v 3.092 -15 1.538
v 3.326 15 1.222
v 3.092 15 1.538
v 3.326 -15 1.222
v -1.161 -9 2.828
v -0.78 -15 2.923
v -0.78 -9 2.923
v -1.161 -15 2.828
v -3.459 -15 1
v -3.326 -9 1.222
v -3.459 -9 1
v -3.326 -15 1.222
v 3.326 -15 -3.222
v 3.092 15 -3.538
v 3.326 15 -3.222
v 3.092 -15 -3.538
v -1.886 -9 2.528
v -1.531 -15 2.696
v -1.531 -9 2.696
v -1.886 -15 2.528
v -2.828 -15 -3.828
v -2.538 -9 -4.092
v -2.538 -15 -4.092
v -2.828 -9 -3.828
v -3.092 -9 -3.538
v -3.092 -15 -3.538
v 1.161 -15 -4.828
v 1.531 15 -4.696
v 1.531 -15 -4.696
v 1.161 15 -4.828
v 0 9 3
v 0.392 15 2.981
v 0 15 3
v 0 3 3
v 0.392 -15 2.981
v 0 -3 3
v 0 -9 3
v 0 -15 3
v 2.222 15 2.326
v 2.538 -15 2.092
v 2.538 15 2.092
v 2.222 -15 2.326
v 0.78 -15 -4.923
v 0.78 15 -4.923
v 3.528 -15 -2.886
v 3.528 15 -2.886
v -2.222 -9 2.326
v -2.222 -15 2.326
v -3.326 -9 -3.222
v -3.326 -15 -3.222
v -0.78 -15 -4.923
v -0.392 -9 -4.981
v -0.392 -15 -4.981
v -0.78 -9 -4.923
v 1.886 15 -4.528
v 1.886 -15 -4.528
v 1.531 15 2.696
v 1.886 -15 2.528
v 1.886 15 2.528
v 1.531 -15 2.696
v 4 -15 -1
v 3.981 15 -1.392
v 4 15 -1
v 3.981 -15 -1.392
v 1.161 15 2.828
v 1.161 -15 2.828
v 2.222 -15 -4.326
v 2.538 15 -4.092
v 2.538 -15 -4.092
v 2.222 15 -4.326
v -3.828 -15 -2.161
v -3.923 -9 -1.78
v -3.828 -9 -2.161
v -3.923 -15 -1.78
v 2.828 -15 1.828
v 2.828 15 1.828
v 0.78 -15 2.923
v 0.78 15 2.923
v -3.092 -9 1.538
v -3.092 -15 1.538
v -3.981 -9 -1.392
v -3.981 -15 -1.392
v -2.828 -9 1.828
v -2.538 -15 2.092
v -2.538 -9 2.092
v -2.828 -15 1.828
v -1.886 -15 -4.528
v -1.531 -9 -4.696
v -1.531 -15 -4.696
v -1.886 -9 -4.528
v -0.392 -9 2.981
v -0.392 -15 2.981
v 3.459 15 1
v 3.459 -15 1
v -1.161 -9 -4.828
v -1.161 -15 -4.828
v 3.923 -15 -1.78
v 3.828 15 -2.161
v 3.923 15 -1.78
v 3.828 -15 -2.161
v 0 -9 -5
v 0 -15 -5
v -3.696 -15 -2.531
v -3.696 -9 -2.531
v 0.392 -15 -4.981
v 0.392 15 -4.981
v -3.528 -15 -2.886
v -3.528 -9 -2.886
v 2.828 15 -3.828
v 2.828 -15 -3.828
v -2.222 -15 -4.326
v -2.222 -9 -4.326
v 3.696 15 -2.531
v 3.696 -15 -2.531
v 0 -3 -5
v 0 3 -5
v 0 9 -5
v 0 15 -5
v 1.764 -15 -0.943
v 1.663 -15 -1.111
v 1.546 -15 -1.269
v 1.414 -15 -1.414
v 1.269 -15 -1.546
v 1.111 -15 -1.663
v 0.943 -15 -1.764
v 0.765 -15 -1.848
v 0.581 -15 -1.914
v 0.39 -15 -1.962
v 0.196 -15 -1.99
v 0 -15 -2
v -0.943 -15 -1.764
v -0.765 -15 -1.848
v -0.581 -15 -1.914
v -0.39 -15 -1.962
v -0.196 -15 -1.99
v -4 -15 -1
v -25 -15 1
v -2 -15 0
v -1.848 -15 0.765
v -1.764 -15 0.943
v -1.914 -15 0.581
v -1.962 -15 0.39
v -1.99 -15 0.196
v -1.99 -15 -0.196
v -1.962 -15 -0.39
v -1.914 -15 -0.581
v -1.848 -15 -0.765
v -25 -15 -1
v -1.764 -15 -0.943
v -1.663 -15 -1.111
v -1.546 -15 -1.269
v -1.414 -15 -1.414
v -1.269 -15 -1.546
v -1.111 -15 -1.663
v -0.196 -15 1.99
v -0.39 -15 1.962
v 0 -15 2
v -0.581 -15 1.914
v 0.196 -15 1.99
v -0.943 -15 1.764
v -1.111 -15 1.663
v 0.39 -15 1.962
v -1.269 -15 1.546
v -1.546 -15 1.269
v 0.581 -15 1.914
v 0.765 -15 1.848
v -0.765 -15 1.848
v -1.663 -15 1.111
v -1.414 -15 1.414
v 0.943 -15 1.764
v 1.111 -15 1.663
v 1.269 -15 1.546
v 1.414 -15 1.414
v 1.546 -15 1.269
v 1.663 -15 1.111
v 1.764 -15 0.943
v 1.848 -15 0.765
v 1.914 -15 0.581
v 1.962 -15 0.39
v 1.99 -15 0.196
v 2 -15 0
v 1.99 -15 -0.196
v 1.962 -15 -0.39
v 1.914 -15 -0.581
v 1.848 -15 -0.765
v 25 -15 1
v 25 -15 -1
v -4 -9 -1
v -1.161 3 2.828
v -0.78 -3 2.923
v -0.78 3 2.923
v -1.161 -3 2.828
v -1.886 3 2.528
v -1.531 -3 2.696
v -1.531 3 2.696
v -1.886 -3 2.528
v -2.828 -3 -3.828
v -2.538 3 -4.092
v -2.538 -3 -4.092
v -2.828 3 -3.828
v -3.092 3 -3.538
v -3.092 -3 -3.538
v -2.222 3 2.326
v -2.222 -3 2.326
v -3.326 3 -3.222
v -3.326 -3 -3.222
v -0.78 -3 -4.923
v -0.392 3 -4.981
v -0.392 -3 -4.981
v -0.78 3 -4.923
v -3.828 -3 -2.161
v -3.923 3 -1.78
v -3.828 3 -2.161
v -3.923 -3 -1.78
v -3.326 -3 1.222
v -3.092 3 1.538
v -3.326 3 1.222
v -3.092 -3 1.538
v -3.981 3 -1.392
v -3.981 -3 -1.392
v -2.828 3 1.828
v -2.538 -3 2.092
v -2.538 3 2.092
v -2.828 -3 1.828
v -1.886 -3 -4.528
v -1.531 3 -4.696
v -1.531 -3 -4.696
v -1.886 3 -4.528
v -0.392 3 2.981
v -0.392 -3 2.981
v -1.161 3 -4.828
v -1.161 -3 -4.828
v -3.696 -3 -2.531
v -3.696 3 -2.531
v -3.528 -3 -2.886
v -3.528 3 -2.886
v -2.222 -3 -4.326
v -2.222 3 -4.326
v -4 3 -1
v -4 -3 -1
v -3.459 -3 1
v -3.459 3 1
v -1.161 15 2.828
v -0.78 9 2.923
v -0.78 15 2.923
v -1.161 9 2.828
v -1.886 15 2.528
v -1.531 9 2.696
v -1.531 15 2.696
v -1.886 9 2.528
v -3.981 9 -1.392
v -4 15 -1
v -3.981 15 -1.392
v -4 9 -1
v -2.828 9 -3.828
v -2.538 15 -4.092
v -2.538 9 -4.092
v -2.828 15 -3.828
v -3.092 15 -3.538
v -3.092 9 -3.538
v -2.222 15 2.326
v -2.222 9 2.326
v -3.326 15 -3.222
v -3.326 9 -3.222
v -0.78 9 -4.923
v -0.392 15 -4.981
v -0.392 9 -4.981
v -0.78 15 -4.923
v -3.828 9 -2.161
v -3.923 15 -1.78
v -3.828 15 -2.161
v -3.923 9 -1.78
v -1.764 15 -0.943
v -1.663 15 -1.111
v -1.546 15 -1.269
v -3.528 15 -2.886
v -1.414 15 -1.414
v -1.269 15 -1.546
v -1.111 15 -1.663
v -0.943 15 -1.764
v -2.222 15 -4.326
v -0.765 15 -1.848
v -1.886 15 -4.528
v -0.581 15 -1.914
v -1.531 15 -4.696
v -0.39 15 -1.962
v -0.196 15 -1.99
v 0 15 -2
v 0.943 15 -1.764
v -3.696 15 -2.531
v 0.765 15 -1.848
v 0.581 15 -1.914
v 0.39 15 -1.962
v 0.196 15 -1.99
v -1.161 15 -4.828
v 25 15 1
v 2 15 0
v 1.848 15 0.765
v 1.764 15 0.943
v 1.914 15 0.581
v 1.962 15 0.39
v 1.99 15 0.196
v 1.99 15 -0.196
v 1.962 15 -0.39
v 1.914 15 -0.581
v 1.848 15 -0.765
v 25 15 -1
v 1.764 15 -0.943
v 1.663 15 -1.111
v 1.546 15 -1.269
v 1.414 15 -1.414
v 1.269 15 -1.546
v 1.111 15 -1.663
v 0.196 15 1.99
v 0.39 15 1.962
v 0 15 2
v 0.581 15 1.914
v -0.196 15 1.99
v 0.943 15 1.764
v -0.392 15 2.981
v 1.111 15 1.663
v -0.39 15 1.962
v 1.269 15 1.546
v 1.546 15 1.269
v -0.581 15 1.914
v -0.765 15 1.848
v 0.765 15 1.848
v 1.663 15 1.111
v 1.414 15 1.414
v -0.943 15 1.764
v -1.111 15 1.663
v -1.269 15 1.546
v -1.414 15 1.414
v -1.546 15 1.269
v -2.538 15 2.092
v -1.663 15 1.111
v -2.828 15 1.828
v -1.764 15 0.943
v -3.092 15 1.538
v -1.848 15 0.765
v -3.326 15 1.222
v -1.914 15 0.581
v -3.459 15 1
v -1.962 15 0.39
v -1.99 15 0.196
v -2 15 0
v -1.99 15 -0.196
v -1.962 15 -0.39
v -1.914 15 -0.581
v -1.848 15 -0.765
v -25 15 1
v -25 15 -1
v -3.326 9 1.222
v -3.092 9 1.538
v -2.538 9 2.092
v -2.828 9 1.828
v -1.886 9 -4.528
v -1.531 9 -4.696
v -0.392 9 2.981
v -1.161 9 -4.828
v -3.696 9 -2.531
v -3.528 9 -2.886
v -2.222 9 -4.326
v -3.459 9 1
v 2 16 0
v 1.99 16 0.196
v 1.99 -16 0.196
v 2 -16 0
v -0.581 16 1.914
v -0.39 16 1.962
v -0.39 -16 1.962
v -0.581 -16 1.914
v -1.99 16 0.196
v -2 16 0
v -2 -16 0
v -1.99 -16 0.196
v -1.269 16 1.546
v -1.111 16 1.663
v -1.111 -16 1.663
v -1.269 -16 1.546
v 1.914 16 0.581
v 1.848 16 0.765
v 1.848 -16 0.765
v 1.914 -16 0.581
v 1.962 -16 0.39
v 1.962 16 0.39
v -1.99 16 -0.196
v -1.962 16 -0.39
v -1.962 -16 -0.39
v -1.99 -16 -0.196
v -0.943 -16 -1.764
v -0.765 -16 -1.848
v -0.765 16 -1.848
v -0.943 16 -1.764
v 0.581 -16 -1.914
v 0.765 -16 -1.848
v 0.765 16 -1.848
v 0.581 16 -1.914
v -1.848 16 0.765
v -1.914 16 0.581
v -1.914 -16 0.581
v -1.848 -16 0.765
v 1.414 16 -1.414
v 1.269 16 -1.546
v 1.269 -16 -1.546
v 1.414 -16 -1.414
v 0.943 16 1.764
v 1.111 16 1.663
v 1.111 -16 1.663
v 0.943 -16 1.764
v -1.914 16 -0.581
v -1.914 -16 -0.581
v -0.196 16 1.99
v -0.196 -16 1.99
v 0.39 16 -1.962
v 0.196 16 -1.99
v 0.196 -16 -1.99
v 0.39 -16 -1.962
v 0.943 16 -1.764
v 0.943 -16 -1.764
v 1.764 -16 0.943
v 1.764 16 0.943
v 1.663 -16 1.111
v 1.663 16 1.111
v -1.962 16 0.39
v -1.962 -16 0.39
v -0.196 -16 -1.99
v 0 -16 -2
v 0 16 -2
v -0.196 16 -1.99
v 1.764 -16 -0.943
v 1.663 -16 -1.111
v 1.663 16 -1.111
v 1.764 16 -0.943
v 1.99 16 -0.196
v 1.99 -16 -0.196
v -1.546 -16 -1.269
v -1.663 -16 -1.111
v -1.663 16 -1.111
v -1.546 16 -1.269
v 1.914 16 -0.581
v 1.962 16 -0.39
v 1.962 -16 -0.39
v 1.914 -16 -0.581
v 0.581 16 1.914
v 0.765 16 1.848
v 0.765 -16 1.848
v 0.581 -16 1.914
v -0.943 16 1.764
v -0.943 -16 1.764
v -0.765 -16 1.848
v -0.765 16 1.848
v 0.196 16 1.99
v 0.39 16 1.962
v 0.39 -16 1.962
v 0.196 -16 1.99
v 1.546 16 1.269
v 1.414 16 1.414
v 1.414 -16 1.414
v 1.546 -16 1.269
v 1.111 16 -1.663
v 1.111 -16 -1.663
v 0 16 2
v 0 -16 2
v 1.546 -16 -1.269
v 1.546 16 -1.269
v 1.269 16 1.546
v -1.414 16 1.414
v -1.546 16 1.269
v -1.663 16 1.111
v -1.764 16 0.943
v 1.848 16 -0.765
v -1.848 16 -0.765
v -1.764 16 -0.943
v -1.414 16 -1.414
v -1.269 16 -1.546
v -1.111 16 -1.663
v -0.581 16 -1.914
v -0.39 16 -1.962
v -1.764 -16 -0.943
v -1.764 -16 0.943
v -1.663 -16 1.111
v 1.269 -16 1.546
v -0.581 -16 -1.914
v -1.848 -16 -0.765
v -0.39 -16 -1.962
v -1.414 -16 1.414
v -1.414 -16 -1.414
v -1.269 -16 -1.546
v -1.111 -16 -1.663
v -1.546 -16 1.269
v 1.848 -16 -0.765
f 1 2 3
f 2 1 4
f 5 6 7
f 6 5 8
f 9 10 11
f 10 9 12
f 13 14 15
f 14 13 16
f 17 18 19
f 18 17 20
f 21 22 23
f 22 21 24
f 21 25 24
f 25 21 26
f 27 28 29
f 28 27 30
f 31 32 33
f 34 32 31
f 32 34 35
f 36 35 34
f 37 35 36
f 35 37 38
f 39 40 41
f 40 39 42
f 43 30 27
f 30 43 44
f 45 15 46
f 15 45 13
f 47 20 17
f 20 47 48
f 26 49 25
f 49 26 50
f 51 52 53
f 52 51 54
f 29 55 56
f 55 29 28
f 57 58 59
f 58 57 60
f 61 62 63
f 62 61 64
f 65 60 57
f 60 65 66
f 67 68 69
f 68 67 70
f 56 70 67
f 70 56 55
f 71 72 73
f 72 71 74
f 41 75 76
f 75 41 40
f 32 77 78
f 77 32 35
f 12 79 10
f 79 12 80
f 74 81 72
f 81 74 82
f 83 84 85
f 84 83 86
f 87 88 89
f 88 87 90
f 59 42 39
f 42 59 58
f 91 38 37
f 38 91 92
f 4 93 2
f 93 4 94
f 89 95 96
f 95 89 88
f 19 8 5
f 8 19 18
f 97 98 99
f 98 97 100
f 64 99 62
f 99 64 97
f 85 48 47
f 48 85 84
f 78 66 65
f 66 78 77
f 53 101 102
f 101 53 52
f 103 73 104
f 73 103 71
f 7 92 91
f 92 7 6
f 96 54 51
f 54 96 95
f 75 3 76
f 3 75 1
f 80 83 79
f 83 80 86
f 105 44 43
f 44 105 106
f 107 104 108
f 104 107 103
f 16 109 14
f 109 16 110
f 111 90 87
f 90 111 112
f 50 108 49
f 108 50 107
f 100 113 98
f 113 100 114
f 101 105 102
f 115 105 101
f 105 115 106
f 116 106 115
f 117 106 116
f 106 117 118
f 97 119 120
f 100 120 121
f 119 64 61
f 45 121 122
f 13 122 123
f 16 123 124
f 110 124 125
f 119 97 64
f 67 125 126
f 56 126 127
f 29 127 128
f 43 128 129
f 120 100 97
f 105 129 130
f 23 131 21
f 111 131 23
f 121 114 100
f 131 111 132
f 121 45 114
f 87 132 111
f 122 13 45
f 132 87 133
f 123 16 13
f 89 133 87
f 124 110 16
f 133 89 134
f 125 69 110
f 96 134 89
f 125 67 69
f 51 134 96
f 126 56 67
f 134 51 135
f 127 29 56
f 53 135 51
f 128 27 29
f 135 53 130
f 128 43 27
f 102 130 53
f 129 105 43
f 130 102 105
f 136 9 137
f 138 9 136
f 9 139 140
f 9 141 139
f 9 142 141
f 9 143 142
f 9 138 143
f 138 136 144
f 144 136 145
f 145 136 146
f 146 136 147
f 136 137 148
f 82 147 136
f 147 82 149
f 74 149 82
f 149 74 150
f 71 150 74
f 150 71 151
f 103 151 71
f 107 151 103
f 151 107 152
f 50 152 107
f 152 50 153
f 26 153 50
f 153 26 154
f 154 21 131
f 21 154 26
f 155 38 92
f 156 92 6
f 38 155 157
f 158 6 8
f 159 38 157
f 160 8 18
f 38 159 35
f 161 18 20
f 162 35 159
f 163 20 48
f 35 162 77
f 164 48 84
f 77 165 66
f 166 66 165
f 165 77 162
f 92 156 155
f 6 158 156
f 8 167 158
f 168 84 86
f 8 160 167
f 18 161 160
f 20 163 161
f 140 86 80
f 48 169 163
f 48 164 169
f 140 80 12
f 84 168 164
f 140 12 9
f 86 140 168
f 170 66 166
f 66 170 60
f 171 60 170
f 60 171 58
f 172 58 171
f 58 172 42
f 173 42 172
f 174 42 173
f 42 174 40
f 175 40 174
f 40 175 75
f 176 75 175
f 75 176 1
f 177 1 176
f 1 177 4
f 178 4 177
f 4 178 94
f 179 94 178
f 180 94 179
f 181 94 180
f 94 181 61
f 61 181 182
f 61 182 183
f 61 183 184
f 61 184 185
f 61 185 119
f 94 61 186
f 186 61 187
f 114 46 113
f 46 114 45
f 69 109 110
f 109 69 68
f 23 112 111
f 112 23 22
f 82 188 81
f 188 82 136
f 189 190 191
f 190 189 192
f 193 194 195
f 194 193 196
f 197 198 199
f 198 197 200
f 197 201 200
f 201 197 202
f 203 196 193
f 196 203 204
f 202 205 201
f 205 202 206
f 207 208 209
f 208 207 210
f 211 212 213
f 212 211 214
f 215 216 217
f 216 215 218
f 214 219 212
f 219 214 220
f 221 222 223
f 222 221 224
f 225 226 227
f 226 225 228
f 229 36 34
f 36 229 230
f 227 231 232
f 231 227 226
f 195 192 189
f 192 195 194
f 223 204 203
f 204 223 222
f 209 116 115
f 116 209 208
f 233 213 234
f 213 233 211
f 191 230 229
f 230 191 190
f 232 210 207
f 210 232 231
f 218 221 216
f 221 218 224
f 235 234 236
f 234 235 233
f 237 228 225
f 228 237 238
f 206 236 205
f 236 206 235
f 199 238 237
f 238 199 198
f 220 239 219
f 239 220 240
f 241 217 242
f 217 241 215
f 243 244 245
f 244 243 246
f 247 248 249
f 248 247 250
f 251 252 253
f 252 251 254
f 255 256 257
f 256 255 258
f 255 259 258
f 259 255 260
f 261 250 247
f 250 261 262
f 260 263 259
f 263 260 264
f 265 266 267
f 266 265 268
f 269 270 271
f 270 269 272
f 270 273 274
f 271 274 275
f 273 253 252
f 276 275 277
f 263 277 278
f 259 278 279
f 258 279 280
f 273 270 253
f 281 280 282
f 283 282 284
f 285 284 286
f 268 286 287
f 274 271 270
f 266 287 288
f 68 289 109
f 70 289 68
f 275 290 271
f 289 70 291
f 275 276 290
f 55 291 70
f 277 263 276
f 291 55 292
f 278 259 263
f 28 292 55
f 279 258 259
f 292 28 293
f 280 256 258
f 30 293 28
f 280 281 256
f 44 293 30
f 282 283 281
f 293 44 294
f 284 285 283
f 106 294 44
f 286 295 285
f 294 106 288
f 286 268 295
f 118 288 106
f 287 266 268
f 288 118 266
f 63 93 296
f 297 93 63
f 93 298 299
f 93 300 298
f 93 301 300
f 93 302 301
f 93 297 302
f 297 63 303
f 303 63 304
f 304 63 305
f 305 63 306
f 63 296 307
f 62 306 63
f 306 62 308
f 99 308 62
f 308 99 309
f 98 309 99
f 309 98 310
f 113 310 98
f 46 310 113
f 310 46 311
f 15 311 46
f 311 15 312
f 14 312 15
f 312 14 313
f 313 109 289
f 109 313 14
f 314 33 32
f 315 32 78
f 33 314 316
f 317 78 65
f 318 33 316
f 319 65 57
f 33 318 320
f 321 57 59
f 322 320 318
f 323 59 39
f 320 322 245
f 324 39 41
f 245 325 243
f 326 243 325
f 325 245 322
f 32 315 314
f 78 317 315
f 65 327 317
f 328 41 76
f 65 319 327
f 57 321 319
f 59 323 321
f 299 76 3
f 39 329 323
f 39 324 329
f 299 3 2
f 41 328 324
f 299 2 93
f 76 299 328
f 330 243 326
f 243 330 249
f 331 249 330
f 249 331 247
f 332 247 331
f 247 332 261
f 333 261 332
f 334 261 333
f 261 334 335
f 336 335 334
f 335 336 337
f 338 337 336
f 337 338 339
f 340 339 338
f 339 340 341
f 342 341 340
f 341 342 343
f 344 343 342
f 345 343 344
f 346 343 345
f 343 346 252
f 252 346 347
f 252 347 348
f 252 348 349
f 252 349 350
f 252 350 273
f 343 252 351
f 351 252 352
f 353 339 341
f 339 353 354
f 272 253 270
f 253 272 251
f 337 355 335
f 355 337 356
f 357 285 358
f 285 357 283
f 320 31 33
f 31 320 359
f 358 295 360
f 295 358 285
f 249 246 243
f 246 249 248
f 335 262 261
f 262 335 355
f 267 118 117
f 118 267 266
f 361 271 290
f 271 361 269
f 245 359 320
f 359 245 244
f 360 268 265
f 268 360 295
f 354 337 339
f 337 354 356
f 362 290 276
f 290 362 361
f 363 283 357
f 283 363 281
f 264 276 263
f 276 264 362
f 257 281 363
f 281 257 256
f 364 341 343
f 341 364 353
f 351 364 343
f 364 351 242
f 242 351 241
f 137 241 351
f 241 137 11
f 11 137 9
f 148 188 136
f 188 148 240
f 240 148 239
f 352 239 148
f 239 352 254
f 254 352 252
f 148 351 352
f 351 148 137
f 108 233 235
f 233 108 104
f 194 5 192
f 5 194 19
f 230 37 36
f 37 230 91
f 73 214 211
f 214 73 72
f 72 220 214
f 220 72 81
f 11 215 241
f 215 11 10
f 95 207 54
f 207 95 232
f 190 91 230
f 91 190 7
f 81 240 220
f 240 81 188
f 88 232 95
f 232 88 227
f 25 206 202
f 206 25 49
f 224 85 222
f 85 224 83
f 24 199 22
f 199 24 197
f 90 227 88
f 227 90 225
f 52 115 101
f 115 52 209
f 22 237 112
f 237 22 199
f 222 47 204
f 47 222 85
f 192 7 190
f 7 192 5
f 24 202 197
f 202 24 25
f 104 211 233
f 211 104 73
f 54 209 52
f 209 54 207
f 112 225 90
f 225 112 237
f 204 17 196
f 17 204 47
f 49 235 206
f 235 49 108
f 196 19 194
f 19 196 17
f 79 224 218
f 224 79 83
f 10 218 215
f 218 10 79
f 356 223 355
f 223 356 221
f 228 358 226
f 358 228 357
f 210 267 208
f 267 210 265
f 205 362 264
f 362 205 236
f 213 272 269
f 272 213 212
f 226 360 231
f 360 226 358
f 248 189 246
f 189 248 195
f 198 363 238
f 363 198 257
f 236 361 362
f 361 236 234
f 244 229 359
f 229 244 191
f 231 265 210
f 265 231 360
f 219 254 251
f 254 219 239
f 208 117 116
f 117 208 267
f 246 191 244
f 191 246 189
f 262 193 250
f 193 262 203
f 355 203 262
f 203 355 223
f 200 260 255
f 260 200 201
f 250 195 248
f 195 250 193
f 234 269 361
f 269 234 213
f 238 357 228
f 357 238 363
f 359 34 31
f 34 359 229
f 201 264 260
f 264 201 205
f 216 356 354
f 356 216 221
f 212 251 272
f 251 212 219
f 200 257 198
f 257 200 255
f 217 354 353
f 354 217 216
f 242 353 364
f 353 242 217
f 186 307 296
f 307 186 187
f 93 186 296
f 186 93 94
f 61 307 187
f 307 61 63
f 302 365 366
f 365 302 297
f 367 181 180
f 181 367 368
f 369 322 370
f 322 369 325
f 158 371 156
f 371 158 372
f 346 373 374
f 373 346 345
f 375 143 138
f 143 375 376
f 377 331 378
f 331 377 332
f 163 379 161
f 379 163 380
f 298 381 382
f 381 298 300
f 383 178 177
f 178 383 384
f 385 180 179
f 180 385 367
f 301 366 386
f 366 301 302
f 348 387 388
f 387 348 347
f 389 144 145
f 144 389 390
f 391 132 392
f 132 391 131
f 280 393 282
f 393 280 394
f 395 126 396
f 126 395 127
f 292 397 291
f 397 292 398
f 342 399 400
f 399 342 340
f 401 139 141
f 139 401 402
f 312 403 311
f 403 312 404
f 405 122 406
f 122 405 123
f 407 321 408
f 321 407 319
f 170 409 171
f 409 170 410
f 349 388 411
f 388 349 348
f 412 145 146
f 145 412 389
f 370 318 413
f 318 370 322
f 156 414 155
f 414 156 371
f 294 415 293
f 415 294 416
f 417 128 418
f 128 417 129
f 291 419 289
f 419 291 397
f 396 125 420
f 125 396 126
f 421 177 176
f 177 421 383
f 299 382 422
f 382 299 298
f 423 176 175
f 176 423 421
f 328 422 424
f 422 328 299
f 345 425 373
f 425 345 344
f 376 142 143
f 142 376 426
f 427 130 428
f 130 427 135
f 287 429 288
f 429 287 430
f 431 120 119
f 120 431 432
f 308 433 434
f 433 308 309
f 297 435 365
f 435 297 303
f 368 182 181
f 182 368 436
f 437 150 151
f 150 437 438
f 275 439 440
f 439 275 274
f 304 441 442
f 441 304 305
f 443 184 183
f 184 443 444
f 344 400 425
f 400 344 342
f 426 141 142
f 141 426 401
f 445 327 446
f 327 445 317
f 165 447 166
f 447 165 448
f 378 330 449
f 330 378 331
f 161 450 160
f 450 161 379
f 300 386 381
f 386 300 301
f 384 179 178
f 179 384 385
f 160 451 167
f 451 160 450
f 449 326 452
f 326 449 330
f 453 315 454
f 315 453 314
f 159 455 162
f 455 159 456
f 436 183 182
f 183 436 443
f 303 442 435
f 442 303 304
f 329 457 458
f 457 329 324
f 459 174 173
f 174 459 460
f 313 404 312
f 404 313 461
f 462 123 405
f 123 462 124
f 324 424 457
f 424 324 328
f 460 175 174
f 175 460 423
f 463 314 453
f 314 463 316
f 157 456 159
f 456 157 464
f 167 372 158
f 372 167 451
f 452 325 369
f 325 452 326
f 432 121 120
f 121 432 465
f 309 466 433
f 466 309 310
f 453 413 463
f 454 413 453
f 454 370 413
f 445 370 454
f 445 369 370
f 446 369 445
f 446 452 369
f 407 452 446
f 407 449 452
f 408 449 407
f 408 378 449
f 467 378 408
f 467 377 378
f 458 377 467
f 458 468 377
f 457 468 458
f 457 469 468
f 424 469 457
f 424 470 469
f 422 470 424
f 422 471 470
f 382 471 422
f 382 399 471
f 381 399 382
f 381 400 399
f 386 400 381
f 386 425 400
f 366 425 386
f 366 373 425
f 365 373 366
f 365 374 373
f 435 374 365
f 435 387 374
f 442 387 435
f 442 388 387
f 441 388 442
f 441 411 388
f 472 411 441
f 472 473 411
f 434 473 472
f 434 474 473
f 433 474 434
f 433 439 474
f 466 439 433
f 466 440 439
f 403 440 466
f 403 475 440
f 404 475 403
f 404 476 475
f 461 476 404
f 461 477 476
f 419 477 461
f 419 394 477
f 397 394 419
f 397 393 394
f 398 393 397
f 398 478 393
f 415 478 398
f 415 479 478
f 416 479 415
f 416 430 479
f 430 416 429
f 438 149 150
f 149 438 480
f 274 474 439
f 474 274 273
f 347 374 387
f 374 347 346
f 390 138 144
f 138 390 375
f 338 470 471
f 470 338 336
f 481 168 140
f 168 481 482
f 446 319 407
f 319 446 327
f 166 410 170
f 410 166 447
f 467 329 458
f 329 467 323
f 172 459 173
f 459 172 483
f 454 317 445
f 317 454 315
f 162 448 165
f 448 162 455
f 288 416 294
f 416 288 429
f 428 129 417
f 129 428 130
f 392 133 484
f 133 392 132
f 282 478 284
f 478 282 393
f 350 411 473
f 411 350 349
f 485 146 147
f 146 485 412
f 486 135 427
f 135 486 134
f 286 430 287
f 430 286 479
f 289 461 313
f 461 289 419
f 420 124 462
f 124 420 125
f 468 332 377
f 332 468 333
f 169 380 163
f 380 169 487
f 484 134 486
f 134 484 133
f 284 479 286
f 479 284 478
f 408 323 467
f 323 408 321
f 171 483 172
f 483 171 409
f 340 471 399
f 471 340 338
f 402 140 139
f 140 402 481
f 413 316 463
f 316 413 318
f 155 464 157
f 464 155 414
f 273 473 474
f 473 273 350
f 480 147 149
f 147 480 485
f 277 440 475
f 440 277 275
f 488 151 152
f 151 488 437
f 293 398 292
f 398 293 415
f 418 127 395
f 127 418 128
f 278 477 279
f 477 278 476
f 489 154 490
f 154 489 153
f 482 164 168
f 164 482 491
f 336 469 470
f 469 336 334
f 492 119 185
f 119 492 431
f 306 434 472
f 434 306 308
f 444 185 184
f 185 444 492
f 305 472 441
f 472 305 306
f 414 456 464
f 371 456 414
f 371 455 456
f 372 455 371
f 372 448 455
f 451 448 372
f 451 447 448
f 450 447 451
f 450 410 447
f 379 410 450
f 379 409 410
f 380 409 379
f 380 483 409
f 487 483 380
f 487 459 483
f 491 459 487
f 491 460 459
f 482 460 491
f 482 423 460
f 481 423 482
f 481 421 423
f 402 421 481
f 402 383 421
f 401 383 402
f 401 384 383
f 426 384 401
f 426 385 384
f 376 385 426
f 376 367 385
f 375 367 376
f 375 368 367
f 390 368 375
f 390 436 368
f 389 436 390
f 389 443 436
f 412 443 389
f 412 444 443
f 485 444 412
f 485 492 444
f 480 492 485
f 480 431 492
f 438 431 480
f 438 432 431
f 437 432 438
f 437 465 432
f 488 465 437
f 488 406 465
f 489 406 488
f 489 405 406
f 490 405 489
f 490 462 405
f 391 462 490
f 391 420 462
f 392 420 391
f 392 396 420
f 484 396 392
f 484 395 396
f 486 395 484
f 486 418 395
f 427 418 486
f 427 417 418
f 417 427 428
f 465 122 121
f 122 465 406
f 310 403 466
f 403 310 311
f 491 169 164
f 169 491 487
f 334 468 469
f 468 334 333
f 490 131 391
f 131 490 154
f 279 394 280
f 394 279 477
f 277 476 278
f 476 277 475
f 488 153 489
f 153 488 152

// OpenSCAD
// openscad
// Corrected small butt hinge (assembled, 180° open)
// - Two leaves (30 x 25 x 2 mm), pin along Y, leaves lie flat in same plane (Z)
// - Knuckles: 5 segments (each 6 mm long along Y) at Y = [-12, -6, 0, 6, 12]
//   Left leaf knuckles at [-12, 0, 12], right leaf at [-6, 6]
// - Knuckle outer Ø8 mm, inner bore Ø4.6 mm
// - Pin Ø4 mm, length 32 mm (1 mm protruding each end)
// - Countersunk M3 holes (3 per leaf) at Y = [-8, 0, 8], 5 mm from outer edge
//   Countersink Ø6 mm x depth 1 mm (from top surface) + through Ø3.2 mm

$fn = 64;

// Dimensions
plate_len = 30;       // along Y
plate_w = 25;         // along X (from hinge outward)
thickness = 2;        // along Z
half_th = thickness / 2;

knuckle_seg = 6;      // each segment length along Y
knuckle_positions = [-12, -6, 0, 6, 12];
left_knuckles = [-12, 0, 12];
right_knuckles = [-6, 6];

knuckle_r_out = 4;    // outer radius (Ø8)
knuckle_r_in = 2.3;   // inner bore radius (Ø4.6)

pin_dia = 4;
pin_r = pin_dia / 2;
pin_len = 32;         // along Y

screw_hole_positions = [-8, 0, 8];
screw_countersink_diam = 6;    // top diameter
screw_countersink_depth = 1;
screw_through_dia = 3.2;       // through hole
screw_offset_from_outer_edge = 5; // mm inward from outer edge along X

// Main assembly: left (x<0), right (x>0), pin along Y at X=0
union() {
    // Left leaf: spans X = -plate_w .. 0, Y = -plate_len/2 .. +plate_len/2, Z = -half_th .. +half_th
    color("silver") left_leaf();

    // Right leaf: spans X = 0 .. +plate_w
    color("silver") right_leaf();

    // Pin (separate part), centered at origin, axis along Y
    color("gray") pin();
}


// Modules

module left_leaf() {
    // Base plate
    translate([-plate_w, -plate_len/2, -half_th])
        union() {
            cube([plate_w, plate_len, thickness]); // X: -plate_w..0

            // Left knuckles (cylinders along Y), centered at X = 0
            for (ypos = left_knuckles) {
                // place cylinder so its centerline is at X=0 (so translate by +0 in this local coords),
                // but since plate origin is at X = -plate_w, knuckle X in world = 0 => local X = plate_w
                translate([plate_w, ypos + plate_len/2, 0])  // adjust Y because cube origin is at -plate_len/2
                    // rotate so cylinder axis is along Y: default is along Z, rotate X by 90 degrees
                    rotate([90, 0, 0])
                        cylinder(h = knuckle_seg, r = knuckle_r_out, center=true);
            }

            // Subtract inner bores of left knuckles (make them tubular)
            // Use difference outside union by doing a subtraction block after union
        }

    // Subtract bores and screw holes (perform difference)
    // We'll reconstruct with difference: plate+knuckles minus bores and screw holes
    // Build plate+knuckles again and subtract
    translate([0,0,0]) difference() {
        // plate+knuckles
        translate([-plate_w, -plate_len/2, -half_th]) {
            union() {
                cube([plate_w, plate_len, thickness]);

                for (ypos = left_knuckles) {
                    translate([plate_w, ypos + plate_len/2, 0])
                        rotate([90, 0, 0])
                            cylinder(h = knuckle_seg, r = knuckle_r_out, center=true);
                }
            }
        }

        // subtract knuckle bores: long cylinders along Y centered at X=0 (world coords)
        for (ypos = left_knuckles) {
            // Bore center at X=0, Y=ypos
            translate([0, ypos, -10]) // start below plates
                rotate([90, 0, 0])
                    cylinder(h = 20 + plate_len + 40, r = knuckle_r_in, center=false);
        }

        // subtract screw through holes and countersinks (on outward face X = -plate_w)
        for (hy = screw_hole_positions) {
            hole_x = -plate_w + screw_offset_from_outer_edge;
            // through hole (extend beyond plate thickness)
            translate([hole_x, hy, -half_th - 1])
                cylinder(h = thickness + 2, r = screw_through_dia/2, center=false);
            // countersink from top surface down screw_countersink_depth
            translate([hole_x, hy, half_th - screw_countersink_depth])
                cylinder(h = screw_countersink_depth, r1 = screw_countersink_diam/2, r2 = screw_through_dia/2, center=false);
        }
    }
}

module right_leaf() {
    // Base plate spanning X=0..+plate_w
    translate([0, -plate_len/2, -half_th])
        union() {
            cube([plate_w, plate_len, thickness]); // X: 0..plate_w

            // Right knuckles at world X=0 -> local X = 0
            for (ypos = right_knuckles) {
                translate([0, ypos + plate_len/2, 0])
                    rotate([90, 0, 0])
                        cylinder(h = knuckle_seg, r = knuckle_r_out, center=true);
            }
        }

    // Subtract bores and screw holes
    translate([0,0,0]) difference() {
        translate([0, -plate_len/2, -half_th]) {
            union() {
                cube([plate_w, plate_len, thickness]);

                for (ypos = right_knuckles) {
                    translate([0, ypos + plate_len/2, 0])
                        rotate([90, 0, 0])
                            cylinder(h = knuckle_seg, r = knuckle_r_out, center=true);
                }
            }
        }

        // subtract knuckle bores at world X=0
        for (ypos = right_knuckles) {
            translate([0, ypos, -10])
                rotate([90, 0, 0])
                    cylinder(h = 20 + plate_len + 40, r = knuckle_r_in, center=false);
        }

        // screw holes on outer face X = +plate_w
        for (hy = screw_hole_positions) {
            hole_x = plate_w - screw_offset_from_outer_edge;
            translate([hole_x, hy, -half_th - 1])
                cylinder(h = thickness + 2, r = screw_through_dia/2, center=false);
            translate([hole_x, hy, half_th - screw_countersink_depth])
                cylinder(h = screw_countersink_depth, r1 = screw_countersink_diam/2, r2 = screw_through_dia/2, center=false);
        }
    }
}

module pin() {
    // Pin axis along Y, center at origin. Rotate cylinder (Z->Y).
    translate([0, 0, 0])
        rotate([90, 0, 0])
            cylinder(h = pin_len, r = pin_r, center=true);
}
